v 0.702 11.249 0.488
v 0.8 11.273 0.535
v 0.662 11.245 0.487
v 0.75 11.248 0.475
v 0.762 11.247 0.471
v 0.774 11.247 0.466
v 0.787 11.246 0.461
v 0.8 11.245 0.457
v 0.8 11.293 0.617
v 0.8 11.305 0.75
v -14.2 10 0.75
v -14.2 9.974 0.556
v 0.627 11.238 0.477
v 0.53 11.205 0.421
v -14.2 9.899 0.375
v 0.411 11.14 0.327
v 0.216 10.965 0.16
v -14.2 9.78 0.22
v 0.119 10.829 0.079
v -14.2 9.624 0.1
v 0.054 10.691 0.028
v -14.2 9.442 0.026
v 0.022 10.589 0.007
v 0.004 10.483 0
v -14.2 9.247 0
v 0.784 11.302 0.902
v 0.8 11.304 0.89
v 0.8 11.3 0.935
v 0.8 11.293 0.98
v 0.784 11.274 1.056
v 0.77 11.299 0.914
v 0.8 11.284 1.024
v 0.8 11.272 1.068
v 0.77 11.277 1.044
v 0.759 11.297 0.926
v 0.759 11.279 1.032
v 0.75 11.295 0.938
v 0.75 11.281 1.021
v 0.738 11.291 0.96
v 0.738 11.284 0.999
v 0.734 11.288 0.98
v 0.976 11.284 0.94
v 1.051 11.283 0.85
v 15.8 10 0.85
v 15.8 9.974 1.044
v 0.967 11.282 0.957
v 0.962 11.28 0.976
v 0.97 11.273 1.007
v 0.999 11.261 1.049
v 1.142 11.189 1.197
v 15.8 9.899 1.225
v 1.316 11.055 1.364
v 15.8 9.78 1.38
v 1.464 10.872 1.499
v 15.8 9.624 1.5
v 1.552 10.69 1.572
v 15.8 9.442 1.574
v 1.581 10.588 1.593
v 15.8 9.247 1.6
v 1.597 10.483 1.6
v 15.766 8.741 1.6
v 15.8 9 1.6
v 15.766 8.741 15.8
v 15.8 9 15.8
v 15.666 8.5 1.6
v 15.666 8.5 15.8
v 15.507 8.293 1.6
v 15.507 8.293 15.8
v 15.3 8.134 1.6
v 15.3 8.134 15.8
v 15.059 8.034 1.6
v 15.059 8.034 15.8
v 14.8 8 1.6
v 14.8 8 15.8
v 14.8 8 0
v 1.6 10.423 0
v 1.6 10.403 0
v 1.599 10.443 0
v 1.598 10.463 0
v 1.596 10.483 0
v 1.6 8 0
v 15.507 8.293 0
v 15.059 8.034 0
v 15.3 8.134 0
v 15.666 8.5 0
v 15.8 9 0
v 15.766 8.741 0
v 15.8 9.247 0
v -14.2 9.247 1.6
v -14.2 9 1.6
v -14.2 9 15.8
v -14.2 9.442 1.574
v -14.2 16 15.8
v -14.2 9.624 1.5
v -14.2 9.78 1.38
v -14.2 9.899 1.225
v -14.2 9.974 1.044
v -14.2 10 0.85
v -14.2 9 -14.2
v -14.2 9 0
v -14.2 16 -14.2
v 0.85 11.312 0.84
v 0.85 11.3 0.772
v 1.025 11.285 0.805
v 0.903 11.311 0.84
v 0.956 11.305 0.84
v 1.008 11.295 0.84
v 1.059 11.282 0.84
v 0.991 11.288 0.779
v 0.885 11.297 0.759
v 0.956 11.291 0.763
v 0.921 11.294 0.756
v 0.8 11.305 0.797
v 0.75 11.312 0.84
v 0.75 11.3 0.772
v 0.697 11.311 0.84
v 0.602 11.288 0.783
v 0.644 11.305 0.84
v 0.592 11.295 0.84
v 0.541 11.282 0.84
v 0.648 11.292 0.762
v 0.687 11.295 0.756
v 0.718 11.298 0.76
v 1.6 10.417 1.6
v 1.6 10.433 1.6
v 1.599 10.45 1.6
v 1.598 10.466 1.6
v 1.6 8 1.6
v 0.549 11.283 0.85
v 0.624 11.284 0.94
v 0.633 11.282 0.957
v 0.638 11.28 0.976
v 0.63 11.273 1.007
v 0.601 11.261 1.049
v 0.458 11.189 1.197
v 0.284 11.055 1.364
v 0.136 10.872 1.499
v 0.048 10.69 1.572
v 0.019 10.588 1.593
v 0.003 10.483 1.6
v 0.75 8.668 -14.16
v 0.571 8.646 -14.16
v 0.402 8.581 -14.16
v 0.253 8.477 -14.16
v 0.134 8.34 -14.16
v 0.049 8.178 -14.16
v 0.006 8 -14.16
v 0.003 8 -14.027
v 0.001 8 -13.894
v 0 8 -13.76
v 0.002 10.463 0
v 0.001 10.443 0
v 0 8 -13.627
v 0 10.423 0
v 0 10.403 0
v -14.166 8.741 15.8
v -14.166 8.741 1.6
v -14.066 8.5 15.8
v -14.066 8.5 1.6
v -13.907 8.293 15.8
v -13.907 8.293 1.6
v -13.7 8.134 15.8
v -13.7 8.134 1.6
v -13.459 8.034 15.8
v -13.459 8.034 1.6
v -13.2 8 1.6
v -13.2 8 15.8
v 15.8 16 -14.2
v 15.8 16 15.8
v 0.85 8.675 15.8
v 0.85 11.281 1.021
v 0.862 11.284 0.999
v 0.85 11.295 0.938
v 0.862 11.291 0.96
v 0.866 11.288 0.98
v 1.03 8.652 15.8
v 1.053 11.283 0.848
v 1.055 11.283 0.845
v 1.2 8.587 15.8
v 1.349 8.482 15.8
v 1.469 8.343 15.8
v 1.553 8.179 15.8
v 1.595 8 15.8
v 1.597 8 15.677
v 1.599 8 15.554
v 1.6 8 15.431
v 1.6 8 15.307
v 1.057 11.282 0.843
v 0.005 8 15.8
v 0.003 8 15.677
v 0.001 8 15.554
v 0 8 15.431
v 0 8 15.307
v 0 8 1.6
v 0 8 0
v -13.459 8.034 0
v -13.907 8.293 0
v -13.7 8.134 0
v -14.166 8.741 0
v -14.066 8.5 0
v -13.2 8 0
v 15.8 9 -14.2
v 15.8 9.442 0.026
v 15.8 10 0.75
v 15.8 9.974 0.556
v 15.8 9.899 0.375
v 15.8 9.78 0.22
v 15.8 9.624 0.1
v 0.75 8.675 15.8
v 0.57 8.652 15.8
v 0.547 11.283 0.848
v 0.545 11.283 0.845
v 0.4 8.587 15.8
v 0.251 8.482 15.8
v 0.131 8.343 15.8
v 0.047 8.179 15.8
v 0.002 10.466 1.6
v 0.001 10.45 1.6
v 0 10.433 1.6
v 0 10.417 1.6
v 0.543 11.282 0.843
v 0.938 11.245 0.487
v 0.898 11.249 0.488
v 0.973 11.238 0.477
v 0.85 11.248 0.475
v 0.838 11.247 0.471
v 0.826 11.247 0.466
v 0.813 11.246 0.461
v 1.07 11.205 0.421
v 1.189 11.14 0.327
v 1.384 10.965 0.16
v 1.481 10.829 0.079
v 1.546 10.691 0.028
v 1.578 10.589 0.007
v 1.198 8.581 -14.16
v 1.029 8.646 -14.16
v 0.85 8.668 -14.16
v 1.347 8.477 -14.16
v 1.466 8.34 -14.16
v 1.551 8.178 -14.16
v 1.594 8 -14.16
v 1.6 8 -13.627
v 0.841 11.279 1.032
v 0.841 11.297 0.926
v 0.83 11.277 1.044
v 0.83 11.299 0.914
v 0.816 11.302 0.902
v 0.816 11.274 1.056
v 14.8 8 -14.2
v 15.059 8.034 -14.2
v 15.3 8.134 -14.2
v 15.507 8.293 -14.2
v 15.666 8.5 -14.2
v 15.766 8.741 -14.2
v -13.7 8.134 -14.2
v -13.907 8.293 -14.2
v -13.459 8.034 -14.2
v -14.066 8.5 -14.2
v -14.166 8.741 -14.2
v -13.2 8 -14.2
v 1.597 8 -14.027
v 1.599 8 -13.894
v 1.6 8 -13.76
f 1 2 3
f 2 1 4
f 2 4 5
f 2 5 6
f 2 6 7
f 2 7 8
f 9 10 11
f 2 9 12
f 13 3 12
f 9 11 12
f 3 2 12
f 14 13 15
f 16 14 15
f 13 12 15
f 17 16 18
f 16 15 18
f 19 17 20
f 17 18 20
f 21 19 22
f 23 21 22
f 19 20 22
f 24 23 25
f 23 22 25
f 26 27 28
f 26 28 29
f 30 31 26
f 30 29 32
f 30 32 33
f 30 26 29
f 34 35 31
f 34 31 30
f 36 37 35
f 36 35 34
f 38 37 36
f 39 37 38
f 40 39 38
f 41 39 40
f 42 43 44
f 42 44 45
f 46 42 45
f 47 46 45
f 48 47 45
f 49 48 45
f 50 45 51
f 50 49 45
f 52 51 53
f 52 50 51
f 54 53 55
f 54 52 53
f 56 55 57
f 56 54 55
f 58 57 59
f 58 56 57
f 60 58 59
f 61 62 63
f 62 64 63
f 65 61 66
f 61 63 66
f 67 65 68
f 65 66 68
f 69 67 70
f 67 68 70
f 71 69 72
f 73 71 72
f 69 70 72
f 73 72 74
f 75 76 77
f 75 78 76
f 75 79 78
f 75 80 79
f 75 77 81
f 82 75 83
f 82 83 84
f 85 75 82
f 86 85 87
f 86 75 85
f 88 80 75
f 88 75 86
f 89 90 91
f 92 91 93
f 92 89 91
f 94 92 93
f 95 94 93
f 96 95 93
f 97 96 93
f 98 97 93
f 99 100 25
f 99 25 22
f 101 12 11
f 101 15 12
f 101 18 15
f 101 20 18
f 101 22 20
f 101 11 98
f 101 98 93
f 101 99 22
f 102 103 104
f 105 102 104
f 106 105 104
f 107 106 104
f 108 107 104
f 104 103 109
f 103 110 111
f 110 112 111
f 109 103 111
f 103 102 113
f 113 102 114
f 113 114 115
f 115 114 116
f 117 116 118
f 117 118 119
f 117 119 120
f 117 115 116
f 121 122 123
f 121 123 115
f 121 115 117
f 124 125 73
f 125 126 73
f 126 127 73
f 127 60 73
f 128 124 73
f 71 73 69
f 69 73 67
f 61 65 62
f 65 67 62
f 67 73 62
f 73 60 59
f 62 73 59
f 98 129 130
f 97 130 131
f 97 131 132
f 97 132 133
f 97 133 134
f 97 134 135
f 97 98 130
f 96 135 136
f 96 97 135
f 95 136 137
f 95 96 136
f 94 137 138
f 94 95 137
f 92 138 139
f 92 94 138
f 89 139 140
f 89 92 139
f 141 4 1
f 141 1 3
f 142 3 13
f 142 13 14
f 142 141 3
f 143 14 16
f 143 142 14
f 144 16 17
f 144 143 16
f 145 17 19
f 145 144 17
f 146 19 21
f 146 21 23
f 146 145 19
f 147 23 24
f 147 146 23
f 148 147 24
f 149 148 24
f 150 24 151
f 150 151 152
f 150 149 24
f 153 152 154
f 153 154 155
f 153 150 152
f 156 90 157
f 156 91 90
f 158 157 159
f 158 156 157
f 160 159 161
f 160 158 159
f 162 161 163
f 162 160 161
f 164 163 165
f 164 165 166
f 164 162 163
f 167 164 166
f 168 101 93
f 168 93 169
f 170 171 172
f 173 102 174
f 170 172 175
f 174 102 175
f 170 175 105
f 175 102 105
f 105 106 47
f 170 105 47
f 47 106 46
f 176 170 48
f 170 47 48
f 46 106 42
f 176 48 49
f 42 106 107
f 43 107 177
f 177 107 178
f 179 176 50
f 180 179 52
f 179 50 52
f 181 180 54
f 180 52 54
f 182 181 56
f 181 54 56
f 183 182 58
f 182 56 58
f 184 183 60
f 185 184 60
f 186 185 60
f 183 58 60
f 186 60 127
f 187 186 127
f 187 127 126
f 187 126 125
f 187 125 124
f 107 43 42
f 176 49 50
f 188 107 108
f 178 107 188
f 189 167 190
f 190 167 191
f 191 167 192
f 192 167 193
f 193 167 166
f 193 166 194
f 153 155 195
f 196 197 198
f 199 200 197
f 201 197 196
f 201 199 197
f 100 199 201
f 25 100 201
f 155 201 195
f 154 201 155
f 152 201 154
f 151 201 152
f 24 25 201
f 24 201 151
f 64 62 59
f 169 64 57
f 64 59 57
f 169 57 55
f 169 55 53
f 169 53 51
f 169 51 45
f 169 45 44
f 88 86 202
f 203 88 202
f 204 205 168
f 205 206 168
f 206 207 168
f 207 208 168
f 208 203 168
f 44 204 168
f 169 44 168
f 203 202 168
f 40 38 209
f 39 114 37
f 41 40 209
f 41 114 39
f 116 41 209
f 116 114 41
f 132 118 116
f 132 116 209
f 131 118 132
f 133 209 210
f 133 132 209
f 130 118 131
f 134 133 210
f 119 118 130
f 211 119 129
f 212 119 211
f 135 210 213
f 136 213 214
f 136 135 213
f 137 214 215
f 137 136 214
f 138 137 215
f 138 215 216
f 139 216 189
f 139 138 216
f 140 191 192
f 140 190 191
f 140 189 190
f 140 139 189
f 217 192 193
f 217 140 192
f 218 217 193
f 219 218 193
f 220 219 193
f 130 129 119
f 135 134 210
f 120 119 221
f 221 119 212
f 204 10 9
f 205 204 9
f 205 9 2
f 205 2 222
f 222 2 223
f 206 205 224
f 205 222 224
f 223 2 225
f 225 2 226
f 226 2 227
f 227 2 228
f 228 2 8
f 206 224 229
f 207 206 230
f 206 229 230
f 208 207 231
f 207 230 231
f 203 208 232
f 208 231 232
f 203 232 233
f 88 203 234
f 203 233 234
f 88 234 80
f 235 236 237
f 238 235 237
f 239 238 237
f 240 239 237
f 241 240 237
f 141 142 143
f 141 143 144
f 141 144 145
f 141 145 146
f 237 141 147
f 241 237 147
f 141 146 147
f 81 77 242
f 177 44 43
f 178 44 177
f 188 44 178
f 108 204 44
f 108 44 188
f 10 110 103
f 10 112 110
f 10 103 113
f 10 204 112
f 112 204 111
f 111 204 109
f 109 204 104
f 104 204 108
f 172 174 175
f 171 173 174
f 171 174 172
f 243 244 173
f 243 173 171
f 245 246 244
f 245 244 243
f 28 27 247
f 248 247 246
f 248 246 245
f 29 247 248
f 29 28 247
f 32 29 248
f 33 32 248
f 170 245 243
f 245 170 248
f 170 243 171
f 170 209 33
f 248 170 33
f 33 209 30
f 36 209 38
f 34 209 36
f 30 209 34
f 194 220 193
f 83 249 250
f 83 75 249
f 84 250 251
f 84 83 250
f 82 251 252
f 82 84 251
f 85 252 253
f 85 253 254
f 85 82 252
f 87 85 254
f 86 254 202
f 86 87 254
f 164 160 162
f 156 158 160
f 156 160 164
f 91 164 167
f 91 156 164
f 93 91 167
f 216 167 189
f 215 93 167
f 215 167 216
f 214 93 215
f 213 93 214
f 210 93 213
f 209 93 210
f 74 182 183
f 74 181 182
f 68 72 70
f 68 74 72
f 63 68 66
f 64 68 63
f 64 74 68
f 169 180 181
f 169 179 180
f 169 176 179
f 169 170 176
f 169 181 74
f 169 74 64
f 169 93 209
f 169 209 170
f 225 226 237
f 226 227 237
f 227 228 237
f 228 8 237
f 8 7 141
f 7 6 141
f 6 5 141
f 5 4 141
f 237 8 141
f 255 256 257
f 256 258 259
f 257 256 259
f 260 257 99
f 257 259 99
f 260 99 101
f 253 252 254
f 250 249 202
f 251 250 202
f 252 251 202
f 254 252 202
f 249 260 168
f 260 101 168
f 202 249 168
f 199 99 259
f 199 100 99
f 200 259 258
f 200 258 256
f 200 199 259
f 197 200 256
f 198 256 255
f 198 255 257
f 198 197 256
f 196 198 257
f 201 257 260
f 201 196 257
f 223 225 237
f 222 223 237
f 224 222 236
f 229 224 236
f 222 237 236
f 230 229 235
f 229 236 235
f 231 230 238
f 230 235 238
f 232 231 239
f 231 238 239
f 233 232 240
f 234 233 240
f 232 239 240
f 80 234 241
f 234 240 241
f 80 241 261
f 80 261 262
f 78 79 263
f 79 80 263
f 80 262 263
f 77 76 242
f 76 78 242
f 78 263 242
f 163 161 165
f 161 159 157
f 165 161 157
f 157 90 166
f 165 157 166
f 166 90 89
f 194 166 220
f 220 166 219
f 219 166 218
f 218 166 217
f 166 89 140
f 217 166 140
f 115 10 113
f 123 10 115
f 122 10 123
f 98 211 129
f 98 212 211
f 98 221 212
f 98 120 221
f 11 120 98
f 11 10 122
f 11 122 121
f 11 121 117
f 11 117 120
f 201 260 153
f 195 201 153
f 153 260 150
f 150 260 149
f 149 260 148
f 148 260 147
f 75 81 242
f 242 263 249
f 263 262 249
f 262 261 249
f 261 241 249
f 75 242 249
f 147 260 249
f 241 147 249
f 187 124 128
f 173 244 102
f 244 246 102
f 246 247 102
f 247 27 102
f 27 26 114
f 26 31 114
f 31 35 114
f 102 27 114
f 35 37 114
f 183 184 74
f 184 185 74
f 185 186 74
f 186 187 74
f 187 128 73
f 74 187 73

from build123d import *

# Parameters (mm, degrees)
PAD001_DEPTH = 1.6
FILLET001_R  = 0.75
PAD_DEPTH    = 1.6
FILLET_R     = 0.75
BOX_W        = 30
BOX_H        = 8
BOX_DEPTH    = 30
FILLET002_R  = 1
FILLET003_R  = 1
FILLET004_R  = 1
FILLET005_R  = 1


with BuildPart() as fillet001:
    # Sketch001 → Pad001 (new body)
    with BuildSketch(Plane(origin=(0, 0, 0.8), x_dir=(0, 1, 0), z_dir=(1, 0, 0))):
        Polygon((11.3125, 0.040257), (8.667595, -14.959743), (0.040255, -14.959743), (0.040255, 15.040257), (8.667595, 15.040257), align=None)
    extrude(amount=PAD001_DEPTH)

    # Fillet001
    fillet001_edges = [fillet001.edges().sort_by_distance(p)[0] for p in [
        (1.6, 9.990048, 8.340257),
        (0, 9.990048, 8.340257),
        (1.6, 9.990048, -6.659743),
        (0, 9.990048, -6.659743),
    ]]
    fillet(fillet001_edges, radius=FILLET001_R)


with BuildPart() as fusion:
    # Sketch → Pad (new body)
    with BuildSketch(Plane(origin=(0.8, 0, 0), x_dir=(1, 0, 0), z_dir=(0, 0, 1))):
        Polygon((-15, 0), (15, 0), (15, 10), (0, 11.304791), (-15, 10), align=None)
    extrude(amount=PAD_DEPTH)

    # Fillet
    fillet_edges = [fusion.edges().sort_by_distance(p)[0] for p in [
        (8.3, 10.652395, 0),
        (8.3, 10.652395, 1.6),
        (-6.7, 10.652396, 1.6),
        (-6.7, 10.652396, 0),
    ]]
    fillet(fillet_edges, radius=FILLET_R)

    # Fusion: union Fillet001
    add(fillet001.part)


with BuildPart() as fillet005:
    # Box → Box (new body)
    with BuildSketch(Plane(origin=(-14.2, 8, -14.2), x_dir=(1, 0, 0), z_dir=(0, 0, 1))):
        with Locations((15, 4)):
            Rectangle(BOX_W, BOX_H)
    extrude(amount=BOX_DEPTH)

    # Cut: cut Fusion
    add(fusion.part, mode=Mode.SUBTRACT)

    # Fillet002
    fillet002_edges = [fillet005.edges().sort_by_distance(p)[0] for p in [
        (15.8, 8, -7.1),
    ]]
    fillet(fillet002_edges, radius=FILLET002_R)

    # Fillet003
    fillet003_edges = [fillet005.edges().sort_by_distance(p)[0] for p in [
        (15.8, 8, 8.7),
    ]]
    fillet(fillet003_edges, radius=FILLET003_R)

    # Fillet004
    fillet004_edges = [fillet005.edges().sort_by_distance(p)[0] for p in [
        (-14.2, 8, -7.1),
    ]]
    fillet(fillet004_edges, radius=FILLET004_R)

    # Fillet005
    fillet005_edges = [fillet005.edges().sort_by_distance(p)[0] for p in [
        (-14.2, 8, 8.7),
    ]]
    fillet(fillet005_edges, radius=FILLET005_R)


solid = fillet005.part
